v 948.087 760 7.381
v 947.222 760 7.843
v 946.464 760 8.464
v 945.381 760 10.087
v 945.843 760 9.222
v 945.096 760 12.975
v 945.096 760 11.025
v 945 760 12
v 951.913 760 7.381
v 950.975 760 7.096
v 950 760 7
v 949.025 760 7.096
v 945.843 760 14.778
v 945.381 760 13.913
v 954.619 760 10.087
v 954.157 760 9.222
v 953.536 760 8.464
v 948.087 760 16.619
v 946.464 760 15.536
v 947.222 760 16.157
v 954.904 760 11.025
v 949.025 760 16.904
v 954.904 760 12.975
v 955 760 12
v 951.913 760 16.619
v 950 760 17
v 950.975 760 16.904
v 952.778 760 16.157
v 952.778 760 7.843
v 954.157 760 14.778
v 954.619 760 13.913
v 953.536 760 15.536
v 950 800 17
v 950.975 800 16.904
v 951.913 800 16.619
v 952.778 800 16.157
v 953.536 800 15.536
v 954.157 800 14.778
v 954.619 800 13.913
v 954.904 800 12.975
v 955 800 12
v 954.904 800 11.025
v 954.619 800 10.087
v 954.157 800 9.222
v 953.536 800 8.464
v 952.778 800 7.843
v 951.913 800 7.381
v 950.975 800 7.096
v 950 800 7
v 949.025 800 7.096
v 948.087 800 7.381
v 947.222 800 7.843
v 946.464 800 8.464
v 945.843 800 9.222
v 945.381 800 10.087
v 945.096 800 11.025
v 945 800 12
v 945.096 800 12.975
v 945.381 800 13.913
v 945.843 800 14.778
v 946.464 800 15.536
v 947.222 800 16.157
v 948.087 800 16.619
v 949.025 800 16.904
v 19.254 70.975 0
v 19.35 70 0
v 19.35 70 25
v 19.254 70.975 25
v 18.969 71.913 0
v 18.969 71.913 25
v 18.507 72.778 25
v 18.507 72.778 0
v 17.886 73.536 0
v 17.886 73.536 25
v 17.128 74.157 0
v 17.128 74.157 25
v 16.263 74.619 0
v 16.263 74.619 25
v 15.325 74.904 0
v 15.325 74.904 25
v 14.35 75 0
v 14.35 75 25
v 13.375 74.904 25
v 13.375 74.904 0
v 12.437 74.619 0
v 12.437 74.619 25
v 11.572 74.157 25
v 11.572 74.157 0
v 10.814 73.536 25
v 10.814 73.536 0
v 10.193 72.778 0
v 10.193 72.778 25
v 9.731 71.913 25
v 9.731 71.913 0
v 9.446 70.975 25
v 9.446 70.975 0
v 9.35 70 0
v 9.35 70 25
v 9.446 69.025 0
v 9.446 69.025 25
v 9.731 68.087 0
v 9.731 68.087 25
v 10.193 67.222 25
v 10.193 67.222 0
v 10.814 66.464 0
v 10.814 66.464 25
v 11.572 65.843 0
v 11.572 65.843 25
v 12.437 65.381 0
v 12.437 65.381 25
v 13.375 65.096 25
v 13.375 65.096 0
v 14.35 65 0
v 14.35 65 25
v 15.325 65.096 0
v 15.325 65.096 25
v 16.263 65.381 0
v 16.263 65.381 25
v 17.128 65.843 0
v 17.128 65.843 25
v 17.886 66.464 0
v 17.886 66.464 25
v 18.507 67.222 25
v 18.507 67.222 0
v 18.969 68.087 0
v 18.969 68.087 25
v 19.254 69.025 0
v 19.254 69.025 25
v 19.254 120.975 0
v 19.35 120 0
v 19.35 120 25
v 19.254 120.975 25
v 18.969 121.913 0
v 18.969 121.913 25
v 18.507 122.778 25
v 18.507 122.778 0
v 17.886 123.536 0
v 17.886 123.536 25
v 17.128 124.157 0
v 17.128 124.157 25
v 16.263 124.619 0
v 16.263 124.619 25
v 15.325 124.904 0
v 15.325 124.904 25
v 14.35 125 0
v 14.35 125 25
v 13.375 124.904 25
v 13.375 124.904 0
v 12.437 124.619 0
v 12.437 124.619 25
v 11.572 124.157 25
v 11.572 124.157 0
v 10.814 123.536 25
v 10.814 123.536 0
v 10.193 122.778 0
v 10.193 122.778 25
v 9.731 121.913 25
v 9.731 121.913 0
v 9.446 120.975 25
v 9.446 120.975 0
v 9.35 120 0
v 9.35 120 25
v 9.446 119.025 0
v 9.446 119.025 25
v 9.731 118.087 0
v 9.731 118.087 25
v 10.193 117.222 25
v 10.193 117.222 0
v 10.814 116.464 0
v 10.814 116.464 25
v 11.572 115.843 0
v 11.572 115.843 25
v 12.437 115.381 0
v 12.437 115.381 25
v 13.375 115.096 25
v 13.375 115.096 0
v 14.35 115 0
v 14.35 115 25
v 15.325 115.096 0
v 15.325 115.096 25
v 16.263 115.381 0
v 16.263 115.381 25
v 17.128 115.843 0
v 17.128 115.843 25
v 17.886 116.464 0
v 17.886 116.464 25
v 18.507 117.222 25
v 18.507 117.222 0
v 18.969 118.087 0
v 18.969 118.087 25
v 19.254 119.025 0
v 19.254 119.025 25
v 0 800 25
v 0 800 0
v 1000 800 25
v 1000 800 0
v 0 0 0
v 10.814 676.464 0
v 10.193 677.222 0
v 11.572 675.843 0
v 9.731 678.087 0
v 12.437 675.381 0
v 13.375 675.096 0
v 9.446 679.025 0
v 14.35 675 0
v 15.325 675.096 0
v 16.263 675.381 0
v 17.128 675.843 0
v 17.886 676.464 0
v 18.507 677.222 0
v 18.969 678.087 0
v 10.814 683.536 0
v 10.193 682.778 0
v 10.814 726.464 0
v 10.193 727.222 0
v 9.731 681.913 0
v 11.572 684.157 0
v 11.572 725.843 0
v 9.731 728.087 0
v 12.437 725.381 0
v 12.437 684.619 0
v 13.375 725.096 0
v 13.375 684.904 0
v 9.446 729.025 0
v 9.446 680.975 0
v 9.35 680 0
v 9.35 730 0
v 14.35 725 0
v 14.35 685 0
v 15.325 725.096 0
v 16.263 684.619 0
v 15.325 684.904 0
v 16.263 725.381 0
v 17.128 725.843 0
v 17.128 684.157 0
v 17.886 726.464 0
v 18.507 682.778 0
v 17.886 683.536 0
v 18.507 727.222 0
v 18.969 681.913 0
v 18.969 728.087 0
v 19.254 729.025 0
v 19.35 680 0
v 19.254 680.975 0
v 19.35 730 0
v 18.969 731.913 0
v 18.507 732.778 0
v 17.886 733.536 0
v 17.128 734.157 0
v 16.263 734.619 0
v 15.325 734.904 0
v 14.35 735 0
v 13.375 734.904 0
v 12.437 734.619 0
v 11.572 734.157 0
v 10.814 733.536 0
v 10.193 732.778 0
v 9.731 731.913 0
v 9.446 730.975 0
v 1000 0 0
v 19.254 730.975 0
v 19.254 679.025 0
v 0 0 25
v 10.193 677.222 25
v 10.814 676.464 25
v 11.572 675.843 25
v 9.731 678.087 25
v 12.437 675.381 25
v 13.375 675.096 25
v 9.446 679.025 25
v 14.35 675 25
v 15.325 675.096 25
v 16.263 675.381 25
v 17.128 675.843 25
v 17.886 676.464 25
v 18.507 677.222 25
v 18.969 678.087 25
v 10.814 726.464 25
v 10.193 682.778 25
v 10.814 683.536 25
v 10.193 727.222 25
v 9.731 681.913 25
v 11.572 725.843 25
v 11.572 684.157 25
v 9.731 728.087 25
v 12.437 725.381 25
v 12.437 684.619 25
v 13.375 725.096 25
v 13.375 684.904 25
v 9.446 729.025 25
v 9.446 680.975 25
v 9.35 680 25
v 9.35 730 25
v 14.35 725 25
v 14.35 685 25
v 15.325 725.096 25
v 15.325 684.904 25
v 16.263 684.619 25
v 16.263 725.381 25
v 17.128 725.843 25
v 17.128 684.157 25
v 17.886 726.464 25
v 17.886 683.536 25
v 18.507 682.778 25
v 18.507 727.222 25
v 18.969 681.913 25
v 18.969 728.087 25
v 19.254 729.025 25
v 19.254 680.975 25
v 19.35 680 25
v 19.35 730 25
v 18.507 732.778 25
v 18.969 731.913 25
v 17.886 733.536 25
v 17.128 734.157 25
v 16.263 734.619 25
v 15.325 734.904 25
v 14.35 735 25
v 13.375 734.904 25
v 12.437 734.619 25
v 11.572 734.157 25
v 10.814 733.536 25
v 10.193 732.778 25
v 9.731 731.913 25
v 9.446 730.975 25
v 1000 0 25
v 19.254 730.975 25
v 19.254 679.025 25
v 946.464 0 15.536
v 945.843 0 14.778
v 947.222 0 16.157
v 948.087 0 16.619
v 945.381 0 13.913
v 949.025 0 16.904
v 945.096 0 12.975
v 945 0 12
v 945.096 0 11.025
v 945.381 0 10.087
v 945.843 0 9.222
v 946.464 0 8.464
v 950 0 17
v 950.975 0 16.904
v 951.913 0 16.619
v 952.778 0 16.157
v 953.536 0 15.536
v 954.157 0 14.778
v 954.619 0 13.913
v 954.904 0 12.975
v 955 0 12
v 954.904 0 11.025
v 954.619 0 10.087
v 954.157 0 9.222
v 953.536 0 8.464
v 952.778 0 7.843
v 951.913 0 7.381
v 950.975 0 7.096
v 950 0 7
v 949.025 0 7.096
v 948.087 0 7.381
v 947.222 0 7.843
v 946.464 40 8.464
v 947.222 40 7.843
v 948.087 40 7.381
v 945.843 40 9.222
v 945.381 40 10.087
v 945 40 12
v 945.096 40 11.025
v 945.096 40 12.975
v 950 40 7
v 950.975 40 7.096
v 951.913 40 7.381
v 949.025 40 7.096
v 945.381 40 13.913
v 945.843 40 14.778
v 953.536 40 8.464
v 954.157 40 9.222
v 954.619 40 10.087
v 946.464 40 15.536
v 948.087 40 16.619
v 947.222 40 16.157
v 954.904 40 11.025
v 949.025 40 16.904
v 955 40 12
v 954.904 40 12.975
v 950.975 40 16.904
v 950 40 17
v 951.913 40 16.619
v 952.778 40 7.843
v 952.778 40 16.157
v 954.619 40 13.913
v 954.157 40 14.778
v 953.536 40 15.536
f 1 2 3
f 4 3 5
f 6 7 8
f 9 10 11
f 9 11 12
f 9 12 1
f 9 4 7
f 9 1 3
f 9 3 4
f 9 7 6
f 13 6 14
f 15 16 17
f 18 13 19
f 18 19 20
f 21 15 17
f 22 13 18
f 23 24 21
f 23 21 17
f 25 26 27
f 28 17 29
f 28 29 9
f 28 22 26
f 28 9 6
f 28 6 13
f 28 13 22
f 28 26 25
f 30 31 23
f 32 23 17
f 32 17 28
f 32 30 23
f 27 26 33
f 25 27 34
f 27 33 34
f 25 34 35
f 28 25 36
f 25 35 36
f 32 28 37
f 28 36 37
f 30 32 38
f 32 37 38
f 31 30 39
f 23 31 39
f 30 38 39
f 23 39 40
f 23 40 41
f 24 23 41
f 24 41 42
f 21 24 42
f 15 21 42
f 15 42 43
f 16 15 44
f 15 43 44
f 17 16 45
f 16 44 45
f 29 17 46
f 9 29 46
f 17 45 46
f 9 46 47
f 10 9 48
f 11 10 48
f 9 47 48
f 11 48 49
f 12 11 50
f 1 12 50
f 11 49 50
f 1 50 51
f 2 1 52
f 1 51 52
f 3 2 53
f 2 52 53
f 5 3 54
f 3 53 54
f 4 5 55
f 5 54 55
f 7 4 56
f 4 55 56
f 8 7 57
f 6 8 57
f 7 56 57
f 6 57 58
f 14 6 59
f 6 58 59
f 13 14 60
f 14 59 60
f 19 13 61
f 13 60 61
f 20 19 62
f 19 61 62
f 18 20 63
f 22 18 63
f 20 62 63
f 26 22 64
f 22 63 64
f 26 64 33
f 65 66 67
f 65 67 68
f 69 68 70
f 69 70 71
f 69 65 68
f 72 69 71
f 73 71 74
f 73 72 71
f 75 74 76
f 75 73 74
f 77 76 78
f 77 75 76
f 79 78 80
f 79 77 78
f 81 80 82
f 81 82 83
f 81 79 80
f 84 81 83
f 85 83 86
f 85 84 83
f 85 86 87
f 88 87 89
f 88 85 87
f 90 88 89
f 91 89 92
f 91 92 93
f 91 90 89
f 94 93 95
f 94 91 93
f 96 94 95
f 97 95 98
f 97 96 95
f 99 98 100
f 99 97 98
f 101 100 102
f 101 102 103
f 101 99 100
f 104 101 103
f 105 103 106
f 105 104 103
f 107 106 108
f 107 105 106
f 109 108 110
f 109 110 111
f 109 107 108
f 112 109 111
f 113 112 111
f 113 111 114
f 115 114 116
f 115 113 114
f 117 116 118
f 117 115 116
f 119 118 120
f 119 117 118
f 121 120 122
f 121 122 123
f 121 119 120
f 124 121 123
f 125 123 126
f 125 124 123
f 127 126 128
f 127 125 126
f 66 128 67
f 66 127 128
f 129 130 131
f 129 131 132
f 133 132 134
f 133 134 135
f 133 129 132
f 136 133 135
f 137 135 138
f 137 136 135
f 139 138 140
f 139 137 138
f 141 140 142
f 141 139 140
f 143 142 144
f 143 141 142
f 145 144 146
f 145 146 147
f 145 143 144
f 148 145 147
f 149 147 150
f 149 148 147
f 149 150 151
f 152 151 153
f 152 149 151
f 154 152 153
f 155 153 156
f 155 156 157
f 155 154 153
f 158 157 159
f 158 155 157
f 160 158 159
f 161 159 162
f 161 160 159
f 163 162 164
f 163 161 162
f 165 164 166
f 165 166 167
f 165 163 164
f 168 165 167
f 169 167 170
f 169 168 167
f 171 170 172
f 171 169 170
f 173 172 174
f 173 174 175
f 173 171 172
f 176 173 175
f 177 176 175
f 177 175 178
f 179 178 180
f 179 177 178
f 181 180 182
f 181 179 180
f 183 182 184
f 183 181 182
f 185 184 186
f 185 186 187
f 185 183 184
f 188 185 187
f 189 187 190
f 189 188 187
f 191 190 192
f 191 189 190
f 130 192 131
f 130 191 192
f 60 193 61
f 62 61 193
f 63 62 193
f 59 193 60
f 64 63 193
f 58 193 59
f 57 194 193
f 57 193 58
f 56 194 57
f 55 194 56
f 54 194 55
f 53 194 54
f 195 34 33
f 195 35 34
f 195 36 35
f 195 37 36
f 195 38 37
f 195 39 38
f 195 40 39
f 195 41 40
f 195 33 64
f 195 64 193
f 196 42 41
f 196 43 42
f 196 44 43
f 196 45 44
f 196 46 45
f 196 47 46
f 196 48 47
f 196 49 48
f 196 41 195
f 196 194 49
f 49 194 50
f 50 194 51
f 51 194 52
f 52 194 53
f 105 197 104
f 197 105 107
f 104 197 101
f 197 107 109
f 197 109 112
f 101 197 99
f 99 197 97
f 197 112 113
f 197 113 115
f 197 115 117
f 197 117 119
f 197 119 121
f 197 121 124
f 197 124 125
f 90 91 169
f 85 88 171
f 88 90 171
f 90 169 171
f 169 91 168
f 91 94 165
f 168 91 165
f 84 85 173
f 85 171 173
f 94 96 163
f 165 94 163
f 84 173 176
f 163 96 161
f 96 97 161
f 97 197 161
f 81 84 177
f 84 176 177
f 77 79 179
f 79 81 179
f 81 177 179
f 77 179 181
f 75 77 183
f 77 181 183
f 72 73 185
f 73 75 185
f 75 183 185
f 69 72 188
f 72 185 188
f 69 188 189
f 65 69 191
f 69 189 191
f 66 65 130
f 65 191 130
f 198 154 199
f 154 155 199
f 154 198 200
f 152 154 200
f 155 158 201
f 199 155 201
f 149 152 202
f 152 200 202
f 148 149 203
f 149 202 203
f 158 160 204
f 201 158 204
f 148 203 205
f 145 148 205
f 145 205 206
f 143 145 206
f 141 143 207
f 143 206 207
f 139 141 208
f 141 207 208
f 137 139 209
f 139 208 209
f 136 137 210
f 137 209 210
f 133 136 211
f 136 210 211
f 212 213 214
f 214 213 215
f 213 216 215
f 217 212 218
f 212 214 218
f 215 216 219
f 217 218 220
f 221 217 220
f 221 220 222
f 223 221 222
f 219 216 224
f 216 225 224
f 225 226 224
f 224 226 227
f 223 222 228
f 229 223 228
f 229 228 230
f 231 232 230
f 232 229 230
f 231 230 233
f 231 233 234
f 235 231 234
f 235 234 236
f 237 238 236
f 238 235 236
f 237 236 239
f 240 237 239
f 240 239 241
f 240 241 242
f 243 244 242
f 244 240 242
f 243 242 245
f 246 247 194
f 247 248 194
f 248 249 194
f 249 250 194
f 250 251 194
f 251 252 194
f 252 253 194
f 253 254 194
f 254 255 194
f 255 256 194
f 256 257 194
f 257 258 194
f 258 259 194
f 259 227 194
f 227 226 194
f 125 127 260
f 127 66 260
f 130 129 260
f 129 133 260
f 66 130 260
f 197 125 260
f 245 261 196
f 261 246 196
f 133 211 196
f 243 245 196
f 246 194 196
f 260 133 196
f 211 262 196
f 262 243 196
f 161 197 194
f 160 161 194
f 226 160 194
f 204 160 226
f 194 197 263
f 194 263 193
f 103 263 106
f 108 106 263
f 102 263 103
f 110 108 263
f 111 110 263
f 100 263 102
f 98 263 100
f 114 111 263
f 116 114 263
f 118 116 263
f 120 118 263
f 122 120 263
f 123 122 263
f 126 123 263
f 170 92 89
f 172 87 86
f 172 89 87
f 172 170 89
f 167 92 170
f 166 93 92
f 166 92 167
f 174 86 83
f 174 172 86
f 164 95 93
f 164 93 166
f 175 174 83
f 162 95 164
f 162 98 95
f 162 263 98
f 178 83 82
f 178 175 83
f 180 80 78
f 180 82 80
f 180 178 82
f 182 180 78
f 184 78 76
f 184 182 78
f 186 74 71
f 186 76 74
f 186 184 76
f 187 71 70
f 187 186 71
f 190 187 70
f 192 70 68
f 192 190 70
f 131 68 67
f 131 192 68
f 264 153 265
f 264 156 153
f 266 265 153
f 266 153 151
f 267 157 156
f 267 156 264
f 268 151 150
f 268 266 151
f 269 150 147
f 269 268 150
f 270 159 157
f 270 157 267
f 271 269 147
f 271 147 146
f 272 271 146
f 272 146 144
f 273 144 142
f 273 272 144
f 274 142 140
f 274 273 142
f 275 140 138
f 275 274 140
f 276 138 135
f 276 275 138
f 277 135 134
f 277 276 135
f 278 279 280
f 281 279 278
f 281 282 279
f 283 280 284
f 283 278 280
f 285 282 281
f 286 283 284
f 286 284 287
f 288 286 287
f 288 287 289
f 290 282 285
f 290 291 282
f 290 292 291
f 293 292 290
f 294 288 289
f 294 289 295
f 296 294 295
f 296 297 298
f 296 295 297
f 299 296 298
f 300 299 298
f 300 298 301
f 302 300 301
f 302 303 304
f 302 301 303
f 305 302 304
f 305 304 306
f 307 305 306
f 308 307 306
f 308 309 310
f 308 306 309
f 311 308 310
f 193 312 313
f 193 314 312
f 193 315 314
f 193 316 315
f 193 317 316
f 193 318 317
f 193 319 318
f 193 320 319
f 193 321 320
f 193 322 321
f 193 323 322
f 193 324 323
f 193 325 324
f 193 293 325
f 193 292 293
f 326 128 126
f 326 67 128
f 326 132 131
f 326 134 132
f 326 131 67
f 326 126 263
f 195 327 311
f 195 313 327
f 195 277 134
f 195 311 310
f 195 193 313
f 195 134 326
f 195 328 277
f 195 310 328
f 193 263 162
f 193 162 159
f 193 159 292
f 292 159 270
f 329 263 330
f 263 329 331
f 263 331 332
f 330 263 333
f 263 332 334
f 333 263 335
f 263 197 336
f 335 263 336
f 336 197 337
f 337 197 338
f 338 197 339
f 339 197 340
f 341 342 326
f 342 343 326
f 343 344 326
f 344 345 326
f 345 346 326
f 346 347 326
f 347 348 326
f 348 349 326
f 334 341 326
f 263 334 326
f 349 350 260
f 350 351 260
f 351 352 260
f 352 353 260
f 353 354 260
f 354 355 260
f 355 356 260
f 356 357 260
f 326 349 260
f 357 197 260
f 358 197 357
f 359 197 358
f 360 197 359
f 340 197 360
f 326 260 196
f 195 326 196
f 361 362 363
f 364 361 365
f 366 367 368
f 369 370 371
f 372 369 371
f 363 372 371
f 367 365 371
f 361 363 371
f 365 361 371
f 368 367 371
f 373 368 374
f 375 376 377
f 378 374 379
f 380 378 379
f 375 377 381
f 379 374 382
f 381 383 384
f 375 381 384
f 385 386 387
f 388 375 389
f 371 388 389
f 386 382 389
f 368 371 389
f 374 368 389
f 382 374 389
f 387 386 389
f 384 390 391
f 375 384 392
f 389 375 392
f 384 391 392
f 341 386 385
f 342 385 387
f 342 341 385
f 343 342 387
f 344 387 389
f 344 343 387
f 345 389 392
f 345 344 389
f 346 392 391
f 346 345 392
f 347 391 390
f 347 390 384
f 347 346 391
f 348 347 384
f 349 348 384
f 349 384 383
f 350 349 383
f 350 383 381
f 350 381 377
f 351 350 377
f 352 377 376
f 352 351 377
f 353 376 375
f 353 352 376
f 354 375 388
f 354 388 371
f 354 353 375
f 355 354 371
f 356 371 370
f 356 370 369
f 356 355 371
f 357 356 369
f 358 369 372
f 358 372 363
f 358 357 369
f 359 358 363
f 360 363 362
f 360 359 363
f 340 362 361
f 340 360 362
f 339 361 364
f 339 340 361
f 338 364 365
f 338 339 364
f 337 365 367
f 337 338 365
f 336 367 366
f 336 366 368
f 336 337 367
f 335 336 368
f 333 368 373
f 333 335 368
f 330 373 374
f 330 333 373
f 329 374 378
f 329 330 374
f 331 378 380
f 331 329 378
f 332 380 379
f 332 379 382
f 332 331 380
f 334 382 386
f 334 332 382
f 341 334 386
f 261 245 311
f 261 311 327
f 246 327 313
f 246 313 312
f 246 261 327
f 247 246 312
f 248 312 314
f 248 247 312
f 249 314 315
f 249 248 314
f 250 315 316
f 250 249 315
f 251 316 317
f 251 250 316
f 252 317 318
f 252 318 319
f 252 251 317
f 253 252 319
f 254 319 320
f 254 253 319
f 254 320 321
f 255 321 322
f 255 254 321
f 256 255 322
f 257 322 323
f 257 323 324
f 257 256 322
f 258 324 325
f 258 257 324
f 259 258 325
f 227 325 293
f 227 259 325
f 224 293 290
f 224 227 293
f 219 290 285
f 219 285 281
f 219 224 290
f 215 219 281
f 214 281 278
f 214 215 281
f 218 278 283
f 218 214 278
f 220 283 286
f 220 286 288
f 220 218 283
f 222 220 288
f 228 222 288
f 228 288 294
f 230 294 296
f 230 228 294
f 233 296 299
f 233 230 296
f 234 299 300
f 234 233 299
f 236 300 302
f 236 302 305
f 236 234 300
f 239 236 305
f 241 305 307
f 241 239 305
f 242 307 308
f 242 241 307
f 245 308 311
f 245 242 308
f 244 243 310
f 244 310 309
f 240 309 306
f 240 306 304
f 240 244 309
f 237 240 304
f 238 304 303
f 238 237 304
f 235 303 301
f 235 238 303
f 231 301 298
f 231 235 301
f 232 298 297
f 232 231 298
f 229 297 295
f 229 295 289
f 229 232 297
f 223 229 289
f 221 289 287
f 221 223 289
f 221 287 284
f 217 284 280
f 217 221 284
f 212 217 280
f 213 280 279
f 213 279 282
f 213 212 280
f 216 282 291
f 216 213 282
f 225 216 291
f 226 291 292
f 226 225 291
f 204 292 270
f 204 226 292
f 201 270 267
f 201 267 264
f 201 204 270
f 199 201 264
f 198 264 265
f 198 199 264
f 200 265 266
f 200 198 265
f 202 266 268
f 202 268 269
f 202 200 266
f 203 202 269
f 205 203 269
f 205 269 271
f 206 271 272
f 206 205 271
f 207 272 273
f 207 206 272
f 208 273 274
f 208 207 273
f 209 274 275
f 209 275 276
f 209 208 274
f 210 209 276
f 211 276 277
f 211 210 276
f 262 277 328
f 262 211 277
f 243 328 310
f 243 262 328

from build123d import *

# Parameters (mm, degrees)
SZKIC1_W                    = 1000
SZKIC1_H                    = 800
DODANIE_WYCI_GNI_CIE1_DEPTH = 25
SZKIC2_R                    = 5
WYTNIJ_WYCI_GNI_CIE3_DEPTH  = 25
SZKIC4_R                    = 5
WYTNIJ_WYCI_GNI_CIE4_DEPTH  = 40


with BuildPart() as part:
    # Szkic1 → Dodanie-wyciągnięcie1 (new body)
    with BuildSketch(Plane.XY):
        with Locations((500, 400)):
            Rectangle(SZKIC1_W, SZKIC1_H)
    extrude(amount=DODANIE_WYCI_GNI_CIE1_DEPTH)

    # Szkic2 → Wytnij-wyciągnięcie3 (cut)
    with BuildSketch(Plane.XY):
        with Locations((14.35, 730)):
            Circle(SZKIC2_R)
        with Locations((14.35, 680)):
            Circle(SZKIC2_R)
        with Locations((14.35, 70)):
            Circle(SZKIC2_R)
        with Locations((14.35, 120)):
            Circle(SZKIC2_R)
    extrude(amount=WYTNIJ_WYCI_GNI_CIE3_DEPTH, mode=Mode.SUBTRACT)

    # Szkic4 → Wytnij-wyciągnięcie4 (cut)
    with BuildSketch(Plane(origin=(0, 0, 0), x_dir=(1, 0, 0), z_dir=(0, 1, 0))):
        with Locations(Location((950, -12, 0), (0, 0, 270))):
            Circle(SZKIC4_R)
    wytnij_wyci_gni_cie4 = extrude(amount=WYTNIJ_WYCI_GNI_CIE4_DEPTH, mode=Mode.SUBTRACT)

    # Lustro2: Wytnij-wyciągnięcie4 across plane
    add(wytnij_wyci_gni_cie4.mirror(Plane.ZX.offset(400)), mode=Mode.SUBTRACT)


solid = part.part
